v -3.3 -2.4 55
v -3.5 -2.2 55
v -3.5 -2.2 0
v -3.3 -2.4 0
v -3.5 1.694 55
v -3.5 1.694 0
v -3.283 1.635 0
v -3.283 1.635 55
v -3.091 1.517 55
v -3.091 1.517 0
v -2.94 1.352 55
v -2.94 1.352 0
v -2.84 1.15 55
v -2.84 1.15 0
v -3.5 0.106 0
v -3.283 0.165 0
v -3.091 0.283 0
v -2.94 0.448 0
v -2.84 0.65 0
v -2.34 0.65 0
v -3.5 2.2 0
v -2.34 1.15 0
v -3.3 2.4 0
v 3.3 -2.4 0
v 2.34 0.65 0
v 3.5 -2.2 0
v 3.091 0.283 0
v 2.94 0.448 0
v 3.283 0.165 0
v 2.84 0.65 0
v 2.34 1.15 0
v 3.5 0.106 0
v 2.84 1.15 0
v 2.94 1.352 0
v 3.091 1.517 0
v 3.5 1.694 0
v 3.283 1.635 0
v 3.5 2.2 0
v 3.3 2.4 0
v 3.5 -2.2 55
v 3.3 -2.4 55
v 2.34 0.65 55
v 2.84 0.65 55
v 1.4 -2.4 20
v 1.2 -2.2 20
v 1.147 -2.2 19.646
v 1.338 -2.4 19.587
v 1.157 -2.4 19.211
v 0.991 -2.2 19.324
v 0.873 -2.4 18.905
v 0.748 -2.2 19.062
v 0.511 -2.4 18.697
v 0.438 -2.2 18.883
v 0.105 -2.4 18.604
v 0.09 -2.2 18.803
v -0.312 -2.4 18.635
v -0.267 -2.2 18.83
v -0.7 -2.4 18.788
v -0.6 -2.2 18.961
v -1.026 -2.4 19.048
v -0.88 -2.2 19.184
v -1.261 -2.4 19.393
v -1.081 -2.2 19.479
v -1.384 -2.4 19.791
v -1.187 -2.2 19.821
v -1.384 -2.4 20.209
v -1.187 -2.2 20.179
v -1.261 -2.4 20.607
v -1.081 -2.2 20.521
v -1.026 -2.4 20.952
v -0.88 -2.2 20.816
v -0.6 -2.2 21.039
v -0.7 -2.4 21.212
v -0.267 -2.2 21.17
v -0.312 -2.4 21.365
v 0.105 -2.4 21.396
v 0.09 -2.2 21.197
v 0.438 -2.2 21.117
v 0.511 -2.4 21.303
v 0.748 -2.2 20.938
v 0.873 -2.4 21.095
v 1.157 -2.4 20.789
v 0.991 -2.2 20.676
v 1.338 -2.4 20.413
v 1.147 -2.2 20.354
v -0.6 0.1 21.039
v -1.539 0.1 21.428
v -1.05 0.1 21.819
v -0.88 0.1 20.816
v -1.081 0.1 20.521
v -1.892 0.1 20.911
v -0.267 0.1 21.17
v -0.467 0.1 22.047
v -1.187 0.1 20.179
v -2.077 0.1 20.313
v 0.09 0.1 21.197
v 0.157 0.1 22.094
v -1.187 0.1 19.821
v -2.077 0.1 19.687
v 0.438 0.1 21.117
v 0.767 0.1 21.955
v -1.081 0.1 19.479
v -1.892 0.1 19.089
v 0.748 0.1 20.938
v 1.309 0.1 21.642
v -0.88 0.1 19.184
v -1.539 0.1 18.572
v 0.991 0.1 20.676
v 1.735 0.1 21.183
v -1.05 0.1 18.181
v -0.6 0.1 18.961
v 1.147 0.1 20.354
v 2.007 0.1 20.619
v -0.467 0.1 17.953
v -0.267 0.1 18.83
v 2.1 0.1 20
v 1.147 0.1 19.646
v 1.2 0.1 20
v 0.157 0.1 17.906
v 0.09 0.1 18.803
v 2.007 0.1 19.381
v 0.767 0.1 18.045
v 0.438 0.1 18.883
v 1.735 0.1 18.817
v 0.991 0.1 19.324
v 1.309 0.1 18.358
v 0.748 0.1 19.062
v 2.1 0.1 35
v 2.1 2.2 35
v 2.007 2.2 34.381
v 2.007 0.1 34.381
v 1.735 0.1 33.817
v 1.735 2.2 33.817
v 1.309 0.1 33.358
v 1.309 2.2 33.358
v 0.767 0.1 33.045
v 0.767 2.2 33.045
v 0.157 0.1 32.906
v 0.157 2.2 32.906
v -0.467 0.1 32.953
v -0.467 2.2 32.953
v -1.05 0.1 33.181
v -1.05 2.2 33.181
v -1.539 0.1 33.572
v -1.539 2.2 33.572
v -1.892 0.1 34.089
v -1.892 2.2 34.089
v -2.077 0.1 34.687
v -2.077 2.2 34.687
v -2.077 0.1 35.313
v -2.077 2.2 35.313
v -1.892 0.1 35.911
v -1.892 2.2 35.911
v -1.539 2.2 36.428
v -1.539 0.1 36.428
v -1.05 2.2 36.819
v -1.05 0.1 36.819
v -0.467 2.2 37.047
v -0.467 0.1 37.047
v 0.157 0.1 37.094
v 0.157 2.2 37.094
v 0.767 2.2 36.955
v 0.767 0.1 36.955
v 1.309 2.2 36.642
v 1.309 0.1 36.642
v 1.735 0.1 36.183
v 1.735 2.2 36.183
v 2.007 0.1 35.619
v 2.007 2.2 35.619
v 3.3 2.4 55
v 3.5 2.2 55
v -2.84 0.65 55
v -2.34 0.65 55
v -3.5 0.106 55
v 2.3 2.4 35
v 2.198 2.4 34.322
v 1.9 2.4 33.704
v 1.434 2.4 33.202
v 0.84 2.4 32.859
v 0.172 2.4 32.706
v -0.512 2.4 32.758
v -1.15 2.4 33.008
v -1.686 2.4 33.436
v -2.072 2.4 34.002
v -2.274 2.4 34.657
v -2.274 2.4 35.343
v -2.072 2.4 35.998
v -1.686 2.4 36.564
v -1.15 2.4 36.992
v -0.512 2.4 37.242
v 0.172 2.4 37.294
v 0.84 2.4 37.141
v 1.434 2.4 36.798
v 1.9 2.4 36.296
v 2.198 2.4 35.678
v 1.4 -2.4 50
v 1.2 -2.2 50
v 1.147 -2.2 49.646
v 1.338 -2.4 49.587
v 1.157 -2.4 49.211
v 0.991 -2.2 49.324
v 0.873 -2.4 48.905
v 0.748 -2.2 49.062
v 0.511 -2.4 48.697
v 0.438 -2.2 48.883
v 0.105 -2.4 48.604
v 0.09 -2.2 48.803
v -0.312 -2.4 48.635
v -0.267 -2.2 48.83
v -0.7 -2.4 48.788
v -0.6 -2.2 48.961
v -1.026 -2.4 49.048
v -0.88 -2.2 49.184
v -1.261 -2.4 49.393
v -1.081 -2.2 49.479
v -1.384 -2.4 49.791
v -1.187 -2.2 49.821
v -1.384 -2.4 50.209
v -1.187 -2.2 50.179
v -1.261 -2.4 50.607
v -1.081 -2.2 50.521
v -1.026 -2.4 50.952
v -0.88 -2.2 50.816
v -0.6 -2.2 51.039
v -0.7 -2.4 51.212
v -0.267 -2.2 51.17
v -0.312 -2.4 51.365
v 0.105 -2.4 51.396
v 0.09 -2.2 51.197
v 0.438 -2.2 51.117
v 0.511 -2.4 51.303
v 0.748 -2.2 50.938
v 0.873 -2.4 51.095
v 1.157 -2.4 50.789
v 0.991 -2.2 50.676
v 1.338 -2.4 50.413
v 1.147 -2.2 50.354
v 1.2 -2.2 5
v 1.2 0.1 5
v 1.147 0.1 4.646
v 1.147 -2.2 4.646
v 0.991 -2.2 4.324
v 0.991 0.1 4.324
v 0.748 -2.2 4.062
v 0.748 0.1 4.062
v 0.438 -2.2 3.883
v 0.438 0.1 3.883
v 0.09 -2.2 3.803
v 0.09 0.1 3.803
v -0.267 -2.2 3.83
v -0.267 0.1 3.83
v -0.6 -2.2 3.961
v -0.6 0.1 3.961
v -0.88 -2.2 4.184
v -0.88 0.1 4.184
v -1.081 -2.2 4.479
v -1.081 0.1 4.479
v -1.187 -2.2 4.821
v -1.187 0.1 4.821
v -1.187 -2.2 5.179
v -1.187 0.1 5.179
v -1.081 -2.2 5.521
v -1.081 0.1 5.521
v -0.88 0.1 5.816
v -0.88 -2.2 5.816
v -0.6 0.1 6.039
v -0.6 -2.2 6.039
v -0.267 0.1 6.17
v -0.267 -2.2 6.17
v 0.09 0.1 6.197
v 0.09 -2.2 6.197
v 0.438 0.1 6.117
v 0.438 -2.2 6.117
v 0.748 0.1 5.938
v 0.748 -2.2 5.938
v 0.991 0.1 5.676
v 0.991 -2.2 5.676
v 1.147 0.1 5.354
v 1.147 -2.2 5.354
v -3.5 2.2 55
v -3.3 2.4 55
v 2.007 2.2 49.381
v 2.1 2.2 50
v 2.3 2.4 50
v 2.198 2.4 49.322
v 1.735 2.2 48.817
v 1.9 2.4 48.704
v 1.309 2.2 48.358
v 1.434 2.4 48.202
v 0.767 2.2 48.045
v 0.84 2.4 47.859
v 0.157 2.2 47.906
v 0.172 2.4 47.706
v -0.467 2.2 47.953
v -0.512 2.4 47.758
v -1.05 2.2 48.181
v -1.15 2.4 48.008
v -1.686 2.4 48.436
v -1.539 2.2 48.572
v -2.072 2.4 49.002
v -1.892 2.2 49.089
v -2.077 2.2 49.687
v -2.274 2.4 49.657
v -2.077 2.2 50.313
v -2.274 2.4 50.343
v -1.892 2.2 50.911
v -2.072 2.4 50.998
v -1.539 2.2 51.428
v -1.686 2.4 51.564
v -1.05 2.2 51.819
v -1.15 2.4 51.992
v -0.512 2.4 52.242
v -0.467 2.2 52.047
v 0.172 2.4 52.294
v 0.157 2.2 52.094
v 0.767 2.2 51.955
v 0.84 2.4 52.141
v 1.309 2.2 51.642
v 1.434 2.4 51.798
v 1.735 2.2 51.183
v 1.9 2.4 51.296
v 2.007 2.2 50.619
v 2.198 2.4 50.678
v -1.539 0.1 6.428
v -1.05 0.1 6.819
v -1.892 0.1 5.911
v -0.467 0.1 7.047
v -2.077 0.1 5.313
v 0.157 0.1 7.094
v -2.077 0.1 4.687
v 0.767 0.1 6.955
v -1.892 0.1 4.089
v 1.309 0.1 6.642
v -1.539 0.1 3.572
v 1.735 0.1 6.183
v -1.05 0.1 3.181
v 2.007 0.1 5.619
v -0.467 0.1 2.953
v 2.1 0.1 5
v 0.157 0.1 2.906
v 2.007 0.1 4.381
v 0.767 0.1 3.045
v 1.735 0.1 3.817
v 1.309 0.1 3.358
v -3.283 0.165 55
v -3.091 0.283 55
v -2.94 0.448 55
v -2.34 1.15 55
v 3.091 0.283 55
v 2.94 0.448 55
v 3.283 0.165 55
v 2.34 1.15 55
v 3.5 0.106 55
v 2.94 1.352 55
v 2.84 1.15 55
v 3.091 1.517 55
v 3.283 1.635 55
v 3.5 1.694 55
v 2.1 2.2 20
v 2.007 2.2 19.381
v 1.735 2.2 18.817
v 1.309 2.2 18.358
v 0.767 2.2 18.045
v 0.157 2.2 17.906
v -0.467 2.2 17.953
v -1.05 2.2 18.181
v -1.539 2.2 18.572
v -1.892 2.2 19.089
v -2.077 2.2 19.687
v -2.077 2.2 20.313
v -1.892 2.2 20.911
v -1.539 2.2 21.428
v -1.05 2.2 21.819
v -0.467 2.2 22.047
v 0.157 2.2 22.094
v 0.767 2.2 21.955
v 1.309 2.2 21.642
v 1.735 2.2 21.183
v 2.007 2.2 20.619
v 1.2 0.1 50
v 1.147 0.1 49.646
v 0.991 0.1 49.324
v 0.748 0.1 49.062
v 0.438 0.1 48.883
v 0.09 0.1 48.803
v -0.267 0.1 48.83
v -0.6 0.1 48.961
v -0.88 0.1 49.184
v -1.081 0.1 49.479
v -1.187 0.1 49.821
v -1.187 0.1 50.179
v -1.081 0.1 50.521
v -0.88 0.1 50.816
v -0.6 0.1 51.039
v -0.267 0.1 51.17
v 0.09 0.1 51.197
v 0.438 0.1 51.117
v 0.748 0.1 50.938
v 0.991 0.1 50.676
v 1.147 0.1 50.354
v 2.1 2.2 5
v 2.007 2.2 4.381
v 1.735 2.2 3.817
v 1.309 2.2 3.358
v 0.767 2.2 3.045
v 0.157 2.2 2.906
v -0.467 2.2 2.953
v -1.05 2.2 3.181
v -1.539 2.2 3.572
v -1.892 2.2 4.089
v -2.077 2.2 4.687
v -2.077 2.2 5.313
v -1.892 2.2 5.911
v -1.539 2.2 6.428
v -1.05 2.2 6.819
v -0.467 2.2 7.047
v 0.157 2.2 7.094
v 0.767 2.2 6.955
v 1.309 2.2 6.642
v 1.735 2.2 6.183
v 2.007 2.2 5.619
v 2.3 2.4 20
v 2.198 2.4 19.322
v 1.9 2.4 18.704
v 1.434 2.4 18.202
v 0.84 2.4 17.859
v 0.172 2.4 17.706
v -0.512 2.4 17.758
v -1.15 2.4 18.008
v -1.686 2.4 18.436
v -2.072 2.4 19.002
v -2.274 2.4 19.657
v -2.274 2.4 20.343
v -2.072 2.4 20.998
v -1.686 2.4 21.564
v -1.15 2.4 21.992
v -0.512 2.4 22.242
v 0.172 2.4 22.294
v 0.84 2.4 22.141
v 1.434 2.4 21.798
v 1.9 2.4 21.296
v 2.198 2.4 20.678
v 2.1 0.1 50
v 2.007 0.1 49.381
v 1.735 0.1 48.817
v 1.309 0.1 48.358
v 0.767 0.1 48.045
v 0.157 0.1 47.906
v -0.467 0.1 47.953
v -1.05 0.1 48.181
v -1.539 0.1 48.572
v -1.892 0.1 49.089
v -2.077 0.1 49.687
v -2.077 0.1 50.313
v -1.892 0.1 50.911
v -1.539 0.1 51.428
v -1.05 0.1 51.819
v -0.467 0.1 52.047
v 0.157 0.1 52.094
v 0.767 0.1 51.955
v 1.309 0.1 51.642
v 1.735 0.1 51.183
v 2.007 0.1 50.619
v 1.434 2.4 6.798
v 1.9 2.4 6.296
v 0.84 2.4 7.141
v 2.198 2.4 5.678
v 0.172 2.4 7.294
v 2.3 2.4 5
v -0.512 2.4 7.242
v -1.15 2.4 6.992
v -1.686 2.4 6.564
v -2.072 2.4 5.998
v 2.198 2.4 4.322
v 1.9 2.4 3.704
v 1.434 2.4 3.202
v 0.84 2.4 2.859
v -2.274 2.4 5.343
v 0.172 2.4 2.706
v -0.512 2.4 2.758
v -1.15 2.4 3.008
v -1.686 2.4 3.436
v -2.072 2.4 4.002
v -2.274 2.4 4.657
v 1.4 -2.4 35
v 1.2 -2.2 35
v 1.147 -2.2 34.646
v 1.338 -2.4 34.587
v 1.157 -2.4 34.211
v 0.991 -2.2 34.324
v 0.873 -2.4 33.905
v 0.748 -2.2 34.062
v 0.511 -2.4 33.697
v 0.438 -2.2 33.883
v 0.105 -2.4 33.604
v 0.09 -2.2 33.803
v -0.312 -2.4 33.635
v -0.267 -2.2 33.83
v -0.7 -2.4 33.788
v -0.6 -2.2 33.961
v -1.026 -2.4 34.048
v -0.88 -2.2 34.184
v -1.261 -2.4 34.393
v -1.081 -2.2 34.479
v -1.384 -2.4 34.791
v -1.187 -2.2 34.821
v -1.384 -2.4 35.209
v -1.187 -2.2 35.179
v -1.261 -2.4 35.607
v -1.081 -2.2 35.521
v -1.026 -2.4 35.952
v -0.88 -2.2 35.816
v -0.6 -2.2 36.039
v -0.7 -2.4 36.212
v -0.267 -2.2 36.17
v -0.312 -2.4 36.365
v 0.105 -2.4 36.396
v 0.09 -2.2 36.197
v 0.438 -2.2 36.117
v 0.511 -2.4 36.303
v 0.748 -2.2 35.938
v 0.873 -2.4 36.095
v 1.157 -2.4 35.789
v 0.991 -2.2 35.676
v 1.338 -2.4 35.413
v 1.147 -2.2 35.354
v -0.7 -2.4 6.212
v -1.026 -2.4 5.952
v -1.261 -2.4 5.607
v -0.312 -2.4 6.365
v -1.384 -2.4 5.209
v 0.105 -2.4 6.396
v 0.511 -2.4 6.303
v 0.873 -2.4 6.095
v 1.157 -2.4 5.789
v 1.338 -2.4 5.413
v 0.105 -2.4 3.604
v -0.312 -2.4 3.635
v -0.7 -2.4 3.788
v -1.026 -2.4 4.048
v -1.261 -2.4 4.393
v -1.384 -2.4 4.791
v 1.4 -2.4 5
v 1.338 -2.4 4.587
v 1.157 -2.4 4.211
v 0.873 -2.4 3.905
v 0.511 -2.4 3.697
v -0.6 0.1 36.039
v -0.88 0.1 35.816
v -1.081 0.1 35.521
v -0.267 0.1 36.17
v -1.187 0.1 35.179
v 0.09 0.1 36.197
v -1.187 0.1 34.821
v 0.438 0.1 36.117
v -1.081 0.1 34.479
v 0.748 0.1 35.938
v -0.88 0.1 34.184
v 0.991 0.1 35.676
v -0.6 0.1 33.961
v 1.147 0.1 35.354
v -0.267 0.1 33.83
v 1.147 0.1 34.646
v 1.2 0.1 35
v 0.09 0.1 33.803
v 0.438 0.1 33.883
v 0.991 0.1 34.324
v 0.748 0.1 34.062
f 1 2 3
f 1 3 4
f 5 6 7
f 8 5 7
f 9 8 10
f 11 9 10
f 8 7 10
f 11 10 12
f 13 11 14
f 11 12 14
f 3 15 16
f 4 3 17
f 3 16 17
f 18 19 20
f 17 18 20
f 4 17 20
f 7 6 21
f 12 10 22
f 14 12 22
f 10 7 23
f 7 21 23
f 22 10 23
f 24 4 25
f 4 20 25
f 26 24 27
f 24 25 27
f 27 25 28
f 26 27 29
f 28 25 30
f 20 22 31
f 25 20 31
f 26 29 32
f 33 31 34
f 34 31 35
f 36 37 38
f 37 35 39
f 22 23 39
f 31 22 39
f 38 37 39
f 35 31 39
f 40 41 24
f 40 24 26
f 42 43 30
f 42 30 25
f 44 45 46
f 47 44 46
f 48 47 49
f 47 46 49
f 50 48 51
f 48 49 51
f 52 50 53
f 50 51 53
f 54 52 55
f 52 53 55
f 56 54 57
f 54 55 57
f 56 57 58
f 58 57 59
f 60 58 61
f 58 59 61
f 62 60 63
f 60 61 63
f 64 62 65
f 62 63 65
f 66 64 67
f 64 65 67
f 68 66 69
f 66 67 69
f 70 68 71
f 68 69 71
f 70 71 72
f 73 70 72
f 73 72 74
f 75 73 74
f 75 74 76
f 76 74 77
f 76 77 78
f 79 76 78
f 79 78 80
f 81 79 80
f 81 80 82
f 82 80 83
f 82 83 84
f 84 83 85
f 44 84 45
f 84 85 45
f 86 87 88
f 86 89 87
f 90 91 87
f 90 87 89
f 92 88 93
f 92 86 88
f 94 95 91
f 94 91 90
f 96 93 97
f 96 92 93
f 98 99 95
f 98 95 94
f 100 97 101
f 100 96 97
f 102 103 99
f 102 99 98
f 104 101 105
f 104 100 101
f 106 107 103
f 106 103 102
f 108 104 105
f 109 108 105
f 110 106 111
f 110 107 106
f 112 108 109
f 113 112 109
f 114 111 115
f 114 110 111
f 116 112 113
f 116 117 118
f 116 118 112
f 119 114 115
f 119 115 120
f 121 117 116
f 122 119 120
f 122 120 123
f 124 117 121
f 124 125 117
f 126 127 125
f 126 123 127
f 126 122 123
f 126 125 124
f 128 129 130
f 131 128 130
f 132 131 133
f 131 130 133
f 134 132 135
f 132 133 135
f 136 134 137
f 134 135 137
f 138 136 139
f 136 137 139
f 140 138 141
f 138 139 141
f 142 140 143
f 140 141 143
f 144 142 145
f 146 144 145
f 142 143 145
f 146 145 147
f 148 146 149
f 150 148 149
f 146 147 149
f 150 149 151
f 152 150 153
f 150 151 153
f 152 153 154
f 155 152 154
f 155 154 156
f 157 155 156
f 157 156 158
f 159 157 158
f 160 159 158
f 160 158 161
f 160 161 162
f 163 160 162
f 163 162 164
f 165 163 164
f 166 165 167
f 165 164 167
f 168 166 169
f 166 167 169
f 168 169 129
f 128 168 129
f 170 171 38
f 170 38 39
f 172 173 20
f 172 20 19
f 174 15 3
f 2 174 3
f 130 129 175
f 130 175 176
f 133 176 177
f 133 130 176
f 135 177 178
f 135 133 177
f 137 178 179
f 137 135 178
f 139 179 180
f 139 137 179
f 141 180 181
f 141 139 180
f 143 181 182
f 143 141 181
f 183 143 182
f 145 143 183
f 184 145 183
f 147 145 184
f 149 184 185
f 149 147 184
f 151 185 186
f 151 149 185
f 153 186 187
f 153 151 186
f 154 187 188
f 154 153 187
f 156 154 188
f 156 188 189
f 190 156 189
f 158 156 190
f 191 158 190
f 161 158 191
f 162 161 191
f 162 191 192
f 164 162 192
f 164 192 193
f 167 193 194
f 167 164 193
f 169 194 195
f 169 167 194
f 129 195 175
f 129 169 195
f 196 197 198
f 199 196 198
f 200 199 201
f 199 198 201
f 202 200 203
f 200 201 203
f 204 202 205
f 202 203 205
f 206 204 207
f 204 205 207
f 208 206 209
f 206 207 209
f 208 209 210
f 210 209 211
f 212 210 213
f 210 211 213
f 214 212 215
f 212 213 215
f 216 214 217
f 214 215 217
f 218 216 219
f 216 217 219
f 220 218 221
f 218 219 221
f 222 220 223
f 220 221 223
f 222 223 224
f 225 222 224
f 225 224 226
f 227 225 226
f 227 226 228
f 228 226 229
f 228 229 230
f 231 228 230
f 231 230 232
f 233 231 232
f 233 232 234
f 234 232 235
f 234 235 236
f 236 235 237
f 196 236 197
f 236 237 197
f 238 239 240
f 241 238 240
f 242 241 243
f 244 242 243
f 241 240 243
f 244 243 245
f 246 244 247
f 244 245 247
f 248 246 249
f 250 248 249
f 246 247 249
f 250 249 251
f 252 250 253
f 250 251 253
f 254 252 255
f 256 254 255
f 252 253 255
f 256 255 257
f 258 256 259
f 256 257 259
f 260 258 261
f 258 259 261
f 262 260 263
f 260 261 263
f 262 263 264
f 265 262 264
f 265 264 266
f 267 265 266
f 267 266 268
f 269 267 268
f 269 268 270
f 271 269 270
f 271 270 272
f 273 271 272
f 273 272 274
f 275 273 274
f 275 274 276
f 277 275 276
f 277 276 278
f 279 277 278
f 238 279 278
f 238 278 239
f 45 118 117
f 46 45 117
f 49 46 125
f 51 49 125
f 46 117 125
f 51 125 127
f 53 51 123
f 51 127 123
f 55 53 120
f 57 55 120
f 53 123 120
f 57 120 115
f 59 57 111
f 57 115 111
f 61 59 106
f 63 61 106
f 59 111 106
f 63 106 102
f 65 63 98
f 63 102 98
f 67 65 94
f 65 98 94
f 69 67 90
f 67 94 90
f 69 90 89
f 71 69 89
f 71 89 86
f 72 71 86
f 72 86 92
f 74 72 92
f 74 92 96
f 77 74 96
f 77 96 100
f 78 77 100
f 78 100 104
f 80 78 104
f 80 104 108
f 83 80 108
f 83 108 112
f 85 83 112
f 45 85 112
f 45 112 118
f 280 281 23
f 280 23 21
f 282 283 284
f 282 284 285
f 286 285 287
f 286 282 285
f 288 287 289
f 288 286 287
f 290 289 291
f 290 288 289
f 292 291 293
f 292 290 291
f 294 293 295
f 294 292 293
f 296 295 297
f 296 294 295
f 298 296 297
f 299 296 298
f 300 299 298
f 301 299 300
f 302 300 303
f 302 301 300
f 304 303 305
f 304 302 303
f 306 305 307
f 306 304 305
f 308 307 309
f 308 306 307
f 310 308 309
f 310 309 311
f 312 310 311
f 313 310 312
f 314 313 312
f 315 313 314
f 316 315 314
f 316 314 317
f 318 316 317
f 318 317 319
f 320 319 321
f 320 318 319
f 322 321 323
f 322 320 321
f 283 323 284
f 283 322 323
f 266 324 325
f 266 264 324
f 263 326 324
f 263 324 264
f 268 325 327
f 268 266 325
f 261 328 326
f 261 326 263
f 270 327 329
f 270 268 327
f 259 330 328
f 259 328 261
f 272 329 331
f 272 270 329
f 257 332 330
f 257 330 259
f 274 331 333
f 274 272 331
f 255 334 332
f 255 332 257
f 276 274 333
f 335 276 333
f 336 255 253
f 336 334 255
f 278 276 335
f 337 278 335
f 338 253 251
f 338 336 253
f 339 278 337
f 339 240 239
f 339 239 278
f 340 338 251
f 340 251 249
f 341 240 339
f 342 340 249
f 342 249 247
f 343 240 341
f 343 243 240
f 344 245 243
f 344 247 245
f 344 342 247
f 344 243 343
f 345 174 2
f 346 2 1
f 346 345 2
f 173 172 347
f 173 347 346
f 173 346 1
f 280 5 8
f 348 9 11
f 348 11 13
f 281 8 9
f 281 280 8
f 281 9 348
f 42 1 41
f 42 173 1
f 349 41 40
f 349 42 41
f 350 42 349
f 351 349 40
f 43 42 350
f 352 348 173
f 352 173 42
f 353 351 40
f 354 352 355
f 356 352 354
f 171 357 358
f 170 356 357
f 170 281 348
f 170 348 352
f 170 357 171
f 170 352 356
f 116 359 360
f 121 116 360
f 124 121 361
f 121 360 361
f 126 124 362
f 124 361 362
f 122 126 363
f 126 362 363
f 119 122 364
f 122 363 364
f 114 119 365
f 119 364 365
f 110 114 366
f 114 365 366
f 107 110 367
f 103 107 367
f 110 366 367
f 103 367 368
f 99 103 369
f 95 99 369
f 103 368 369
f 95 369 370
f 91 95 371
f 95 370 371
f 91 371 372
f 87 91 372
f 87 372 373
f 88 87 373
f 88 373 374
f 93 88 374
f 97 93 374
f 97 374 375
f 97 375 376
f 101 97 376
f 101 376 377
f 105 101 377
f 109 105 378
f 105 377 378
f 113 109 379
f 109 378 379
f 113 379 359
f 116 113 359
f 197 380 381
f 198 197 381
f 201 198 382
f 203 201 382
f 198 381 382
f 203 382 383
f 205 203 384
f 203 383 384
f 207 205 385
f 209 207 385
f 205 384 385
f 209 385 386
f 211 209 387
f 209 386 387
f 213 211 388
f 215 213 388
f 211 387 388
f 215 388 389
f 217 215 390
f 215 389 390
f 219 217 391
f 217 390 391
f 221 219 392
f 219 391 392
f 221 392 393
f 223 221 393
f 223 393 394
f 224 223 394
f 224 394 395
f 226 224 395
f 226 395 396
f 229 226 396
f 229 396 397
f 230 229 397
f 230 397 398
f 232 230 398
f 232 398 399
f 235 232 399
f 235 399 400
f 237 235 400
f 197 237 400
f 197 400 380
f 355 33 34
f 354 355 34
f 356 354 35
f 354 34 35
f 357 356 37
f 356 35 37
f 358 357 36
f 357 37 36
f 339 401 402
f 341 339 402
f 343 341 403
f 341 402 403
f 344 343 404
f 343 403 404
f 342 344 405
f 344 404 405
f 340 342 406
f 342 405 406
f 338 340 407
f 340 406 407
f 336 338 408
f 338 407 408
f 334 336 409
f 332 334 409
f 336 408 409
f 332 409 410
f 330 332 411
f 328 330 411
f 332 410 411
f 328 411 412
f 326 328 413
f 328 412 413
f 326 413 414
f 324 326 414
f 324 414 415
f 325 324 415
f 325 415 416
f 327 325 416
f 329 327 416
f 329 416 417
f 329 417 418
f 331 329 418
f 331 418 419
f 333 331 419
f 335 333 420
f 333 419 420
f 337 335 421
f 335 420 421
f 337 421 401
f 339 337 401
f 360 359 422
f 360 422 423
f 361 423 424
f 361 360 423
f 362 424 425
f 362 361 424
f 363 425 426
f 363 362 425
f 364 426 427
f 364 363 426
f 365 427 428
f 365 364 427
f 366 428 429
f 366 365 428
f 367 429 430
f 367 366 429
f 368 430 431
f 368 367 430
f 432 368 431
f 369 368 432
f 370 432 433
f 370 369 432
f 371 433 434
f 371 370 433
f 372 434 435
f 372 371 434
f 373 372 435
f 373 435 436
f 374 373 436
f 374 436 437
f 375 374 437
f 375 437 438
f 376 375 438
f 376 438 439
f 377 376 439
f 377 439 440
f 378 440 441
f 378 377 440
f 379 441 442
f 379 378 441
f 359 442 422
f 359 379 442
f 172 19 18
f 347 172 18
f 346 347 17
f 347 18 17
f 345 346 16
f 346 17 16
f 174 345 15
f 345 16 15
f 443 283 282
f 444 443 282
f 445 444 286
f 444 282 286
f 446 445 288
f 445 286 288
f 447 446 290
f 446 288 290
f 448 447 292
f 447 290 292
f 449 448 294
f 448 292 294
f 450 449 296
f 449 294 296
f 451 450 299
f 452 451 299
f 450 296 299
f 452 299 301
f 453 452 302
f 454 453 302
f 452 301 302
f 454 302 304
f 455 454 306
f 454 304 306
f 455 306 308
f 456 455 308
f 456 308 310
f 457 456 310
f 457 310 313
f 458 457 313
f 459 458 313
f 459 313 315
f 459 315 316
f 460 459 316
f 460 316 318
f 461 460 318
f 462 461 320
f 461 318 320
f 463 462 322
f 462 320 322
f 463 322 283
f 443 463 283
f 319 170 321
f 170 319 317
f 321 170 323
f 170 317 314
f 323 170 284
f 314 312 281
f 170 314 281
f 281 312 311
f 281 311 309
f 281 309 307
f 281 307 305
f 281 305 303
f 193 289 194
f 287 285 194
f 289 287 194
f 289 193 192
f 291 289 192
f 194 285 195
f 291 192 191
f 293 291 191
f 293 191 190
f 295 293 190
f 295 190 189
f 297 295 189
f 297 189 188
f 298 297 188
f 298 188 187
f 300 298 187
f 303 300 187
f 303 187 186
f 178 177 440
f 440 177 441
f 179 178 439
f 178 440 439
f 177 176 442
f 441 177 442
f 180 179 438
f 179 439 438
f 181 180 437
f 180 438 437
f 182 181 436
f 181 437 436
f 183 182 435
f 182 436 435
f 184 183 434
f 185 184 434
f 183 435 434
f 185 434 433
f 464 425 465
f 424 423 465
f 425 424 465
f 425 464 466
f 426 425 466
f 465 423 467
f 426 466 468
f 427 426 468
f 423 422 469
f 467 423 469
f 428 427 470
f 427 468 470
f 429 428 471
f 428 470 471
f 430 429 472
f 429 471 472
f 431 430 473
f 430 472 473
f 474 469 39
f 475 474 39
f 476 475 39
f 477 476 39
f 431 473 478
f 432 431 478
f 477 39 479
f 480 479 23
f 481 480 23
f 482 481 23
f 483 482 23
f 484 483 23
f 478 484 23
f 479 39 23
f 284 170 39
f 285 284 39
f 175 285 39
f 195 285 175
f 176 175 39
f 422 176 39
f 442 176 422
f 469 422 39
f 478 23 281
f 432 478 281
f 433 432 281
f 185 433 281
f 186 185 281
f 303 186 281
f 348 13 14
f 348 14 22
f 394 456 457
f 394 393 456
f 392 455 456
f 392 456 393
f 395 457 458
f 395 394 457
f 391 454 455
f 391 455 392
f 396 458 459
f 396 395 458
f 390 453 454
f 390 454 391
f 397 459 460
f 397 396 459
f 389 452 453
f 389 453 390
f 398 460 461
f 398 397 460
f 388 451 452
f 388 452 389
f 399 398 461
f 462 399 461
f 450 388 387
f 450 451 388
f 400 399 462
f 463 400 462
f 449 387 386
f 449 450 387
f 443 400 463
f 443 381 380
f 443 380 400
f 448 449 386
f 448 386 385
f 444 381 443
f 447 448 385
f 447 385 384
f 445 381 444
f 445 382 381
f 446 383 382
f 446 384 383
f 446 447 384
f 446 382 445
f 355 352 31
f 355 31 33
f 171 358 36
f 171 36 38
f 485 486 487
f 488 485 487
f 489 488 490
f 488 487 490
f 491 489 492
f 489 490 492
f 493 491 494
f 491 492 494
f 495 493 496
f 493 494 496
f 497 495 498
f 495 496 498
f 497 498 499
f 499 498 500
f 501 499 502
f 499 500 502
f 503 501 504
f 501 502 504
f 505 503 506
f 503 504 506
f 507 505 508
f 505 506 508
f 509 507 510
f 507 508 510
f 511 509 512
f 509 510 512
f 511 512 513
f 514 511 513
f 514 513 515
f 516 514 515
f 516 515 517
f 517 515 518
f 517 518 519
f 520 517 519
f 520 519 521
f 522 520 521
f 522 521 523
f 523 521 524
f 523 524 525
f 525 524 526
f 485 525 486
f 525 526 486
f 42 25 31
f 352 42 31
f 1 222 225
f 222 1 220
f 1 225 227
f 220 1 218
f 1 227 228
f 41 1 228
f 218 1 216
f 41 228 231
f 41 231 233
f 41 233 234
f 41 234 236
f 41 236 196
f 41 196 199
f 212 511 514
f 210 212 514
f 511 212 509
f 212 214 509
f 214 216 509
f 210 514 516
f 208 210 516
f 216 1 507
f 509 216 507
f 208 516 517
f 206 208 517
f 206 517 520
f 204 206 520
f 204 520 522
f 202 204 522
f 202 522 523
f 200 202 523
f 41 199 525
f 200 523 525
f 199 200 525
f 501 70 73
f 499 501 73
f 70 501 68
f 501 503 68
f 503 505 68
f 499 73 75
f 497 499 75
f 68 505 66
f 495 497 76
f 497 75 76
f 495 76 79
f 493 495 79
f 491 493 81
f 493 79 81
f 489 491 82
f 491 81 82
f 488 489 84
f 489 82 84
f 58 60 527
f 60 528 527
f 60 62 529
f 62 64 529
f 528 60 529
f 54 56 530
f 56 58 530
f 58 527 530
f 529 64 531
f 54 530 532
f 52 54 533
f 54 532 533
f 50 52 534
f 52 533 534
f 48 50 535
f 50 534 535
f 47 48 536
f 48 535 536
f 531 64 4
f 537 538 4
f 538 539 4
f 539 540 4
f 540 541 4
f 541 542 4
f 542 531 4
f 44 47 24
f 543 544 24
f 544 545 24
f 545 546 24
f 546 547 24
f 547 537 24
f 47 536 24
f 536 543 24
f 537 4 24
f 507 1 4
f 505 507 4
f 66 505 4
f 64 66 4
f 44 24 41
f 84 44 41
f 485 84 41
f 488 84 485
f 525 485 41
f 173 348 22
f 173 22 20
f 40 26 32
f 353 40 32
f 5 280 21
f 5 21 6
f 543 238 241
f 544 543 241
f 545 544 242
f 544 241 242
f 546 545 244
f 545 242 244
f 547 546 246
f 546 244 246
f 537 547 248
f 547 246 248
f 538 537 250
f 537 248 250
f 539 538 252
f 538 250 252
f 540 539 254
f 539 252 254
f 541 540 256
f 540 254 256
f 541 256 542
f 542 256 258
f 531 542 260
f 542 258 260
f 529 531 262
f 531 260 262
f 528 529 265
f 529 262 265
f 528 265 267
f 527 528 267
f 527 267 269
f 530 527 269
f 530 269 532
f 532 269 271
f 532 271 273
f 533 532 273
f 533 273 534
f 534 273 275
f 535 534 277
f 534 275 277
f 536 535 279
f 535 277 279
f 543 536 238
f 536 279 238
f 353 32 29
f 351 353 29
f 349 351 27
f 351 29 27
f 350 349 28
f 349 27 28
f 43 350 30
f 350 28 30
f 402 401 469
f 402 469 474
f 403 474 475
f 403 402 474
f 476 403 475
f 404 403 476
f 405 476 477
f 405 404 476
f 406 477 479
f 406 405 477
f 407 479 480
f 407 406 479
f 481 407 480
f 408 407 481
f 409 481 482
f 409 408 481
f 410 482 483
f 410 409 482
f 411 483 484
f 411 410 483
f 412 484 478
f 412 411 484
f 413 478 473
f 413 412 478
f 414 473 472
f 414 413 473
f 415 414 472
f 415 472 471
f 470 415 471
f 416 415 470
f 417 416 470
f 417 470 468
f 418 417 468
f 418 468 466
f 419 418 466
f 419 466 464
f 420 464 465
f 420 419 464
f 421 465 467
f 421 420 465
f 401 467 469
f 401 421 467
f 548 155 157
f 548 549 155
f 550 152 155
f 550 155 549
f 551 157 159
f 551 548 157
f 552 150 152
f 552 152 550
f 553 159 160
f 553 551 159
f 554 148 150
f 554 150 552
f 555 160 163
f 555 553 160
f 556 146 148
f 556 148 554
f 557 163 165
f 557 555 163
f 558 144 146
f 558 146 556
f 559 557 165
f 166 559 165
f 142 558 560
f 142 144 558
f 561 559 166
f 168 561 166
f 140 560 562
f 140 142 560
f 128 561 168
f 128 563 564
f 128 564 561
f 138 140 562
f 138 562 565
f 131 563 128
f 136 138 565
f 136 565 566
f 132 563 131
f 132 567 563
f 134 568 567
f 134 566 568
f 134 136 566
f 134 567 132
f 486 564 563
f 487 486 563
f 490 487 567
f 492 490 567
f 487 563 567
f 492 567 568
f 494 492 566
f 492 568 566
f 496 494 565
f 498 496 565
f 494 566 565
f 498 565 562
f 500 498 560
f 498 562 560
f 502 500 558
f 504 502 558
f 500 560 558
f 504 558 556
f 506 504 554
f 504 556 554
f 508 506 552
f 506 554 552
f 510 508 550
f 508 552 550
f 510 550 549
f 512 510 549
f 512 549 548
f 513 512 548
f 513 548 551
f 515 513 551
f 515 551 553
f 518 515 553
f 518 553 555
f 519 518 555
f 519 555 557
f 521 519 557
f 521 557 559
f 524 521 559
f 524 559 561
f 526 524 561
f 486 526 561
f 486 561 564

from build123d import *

# Parameters (mm, degrees)
EXTRUDE1_DEPTH             = 55
EXTRUDE2_REACH             = 57.32
SKETCH2_R                  = 1.2
SKETCH_R                   = 2.1
SKETCH_R_2                 = 1.2
EXTRUDE4_DEPTH             = 2.3
CHAMFER1_SIZE              = 0.2
LPATTERN1_COUNT            = 4
LPATTERN1_PITCH            = 15
CHAMFER1_OF_LPATTERN1_SIZE = 0.2


with BuildPart() as part:
    # Sketch1 → Extrude1 (new body)
    with BuildSketch(Plane.XY):
        with BuildLine():
            Line((-3.3, -2.4), (3.3, -2.4))
            Line((3.3, -2.4), (3.5, -2.2))
            Line((3.5, -2.2), (3.5, 0.106274607))
            ThreePointArc((3.5, 0.106274607), (3.091294745, 0.282570681), (2.840065792, 0.65))
            Line((2.840065792, 0.65), (2.340065792, 0.65))
            Line((2.340065792, 0.65), (2.340065792, 1.15))
            Line((2.340065792, 1.15), (2.840065792, 1.15))
            ThreePointArc((2.840065792, 1.15), (3.091294745, 1.517429319), (3.5, 1.693725393))
            Line((3.5, 1.693725393), (3.5, 2.2))
            Line((3.5, 2.2), (3.3, 2.4))
            Line((3.3, 2.4), (-3.3, 2.4))
            Line((-3.3, 2.4), (-3.5, 2.2))
            Line((-3.5, 2.2), (-3.5, 1.693725393))
            ThreePointArc((-3.5, 1.693725393), (-3.091294745, 1.517429319), (-2.840065792, 1.15))
            Line((-2.840065792, 1.15), (-2.340065792, 1.15))
            Line((-2.340065792, 1.15), (-2.340065792, 0.65))
            Line((-2.340065792, 0.65), (-2.840065792, 0.65))
            ThreePointArc((-2.840065792, 0.65), (-3.091294745, 0.282570681), (-3.5, 0.106274607))
            Line((-3.5, 0.106274607), (-3.5, -2.2))
            Line((-3.5, -2.2), (-3.3, -2.4))
        make_face()
    extrude(amount=EXTRUDE1_DEPTH)

    # Sketch2 → Extrude2 (cut, up to next)
    with BuildSketch(Plane(origin=(0, 2.4, 0), x_dir=(1, 0, 0), z_dir=(0, 1, 0)), mode=Mode.PRIVATE) as extrude2_sk1:
        with Locations((0, -5)):
            Circle(SKETCH2_R)
    extrude2_tool1 = extrude(extrude2_sk1.sketch, amount=-EXTRUDE2_REACH, mode=Mode.PRIVATE) & part.part
    extrude2 = extrude2_tool1.solids().sort_by_distance((0, 2.4, 5))[0]
    add(extrude2, mode=Mode.SUBTRACT)

    # Sketch → Extrude4 (cut)
    with BuildSketch(Plane(origin=(0, 2.4, 0), x_dir=(1, 0, 0), z_dir=(0, 1, 0))):
        with Locations((0, -5)):
            Circle(SKETCH_R)
        with Locations((0, -5)):
            Circle(SKETCH_R_2, mode=Mode.SUBTRACT)
    extrude4 = extrude(amount=-EXTRUDE4_DEPTH, mode=Mode.SUBTRACT)

    # Chamfer1
    chamfer1_edges = [part.edges().sort_by_distance(p)[0] for p in [
        (-1.2, -2.4, 5),
        (-2.1, 2.4, 5),
    ]]
    chamfer(chamfer1_edges, length=CHAMFER1_SIZE)

    # LPattern1: Extrude2, Extrude4 ×4
    with Locations(*[(0, 0, i * LPATTERN1_PITCH) for i in range(1, LPATTERN1_COUNT)]):
        add(extrude2, mode=Mode.SUBTRACT)
        add(extrude4, mode=Mode.SUBTRACT)

    # Chamfer1 of LPattern1
    chamfer1_of_lpattern1_edges = [part.edges().sort_by_distance(p)[0] for p in [
        (-1.2, -2.4, 20),
        (-2.1, 2.4, 20),
        (-1.2, -2.4, 35),
        (-2.1, 2.4, 35),
        (-1.2, -2.4, 50),
        (-2.1, 2.4, 50),
    ]]
    chamfer(chamfer1_of_lpattern1_edges, length=CHAMFER1_OF_LPATTERN1_SIZE)


solid = part.part
